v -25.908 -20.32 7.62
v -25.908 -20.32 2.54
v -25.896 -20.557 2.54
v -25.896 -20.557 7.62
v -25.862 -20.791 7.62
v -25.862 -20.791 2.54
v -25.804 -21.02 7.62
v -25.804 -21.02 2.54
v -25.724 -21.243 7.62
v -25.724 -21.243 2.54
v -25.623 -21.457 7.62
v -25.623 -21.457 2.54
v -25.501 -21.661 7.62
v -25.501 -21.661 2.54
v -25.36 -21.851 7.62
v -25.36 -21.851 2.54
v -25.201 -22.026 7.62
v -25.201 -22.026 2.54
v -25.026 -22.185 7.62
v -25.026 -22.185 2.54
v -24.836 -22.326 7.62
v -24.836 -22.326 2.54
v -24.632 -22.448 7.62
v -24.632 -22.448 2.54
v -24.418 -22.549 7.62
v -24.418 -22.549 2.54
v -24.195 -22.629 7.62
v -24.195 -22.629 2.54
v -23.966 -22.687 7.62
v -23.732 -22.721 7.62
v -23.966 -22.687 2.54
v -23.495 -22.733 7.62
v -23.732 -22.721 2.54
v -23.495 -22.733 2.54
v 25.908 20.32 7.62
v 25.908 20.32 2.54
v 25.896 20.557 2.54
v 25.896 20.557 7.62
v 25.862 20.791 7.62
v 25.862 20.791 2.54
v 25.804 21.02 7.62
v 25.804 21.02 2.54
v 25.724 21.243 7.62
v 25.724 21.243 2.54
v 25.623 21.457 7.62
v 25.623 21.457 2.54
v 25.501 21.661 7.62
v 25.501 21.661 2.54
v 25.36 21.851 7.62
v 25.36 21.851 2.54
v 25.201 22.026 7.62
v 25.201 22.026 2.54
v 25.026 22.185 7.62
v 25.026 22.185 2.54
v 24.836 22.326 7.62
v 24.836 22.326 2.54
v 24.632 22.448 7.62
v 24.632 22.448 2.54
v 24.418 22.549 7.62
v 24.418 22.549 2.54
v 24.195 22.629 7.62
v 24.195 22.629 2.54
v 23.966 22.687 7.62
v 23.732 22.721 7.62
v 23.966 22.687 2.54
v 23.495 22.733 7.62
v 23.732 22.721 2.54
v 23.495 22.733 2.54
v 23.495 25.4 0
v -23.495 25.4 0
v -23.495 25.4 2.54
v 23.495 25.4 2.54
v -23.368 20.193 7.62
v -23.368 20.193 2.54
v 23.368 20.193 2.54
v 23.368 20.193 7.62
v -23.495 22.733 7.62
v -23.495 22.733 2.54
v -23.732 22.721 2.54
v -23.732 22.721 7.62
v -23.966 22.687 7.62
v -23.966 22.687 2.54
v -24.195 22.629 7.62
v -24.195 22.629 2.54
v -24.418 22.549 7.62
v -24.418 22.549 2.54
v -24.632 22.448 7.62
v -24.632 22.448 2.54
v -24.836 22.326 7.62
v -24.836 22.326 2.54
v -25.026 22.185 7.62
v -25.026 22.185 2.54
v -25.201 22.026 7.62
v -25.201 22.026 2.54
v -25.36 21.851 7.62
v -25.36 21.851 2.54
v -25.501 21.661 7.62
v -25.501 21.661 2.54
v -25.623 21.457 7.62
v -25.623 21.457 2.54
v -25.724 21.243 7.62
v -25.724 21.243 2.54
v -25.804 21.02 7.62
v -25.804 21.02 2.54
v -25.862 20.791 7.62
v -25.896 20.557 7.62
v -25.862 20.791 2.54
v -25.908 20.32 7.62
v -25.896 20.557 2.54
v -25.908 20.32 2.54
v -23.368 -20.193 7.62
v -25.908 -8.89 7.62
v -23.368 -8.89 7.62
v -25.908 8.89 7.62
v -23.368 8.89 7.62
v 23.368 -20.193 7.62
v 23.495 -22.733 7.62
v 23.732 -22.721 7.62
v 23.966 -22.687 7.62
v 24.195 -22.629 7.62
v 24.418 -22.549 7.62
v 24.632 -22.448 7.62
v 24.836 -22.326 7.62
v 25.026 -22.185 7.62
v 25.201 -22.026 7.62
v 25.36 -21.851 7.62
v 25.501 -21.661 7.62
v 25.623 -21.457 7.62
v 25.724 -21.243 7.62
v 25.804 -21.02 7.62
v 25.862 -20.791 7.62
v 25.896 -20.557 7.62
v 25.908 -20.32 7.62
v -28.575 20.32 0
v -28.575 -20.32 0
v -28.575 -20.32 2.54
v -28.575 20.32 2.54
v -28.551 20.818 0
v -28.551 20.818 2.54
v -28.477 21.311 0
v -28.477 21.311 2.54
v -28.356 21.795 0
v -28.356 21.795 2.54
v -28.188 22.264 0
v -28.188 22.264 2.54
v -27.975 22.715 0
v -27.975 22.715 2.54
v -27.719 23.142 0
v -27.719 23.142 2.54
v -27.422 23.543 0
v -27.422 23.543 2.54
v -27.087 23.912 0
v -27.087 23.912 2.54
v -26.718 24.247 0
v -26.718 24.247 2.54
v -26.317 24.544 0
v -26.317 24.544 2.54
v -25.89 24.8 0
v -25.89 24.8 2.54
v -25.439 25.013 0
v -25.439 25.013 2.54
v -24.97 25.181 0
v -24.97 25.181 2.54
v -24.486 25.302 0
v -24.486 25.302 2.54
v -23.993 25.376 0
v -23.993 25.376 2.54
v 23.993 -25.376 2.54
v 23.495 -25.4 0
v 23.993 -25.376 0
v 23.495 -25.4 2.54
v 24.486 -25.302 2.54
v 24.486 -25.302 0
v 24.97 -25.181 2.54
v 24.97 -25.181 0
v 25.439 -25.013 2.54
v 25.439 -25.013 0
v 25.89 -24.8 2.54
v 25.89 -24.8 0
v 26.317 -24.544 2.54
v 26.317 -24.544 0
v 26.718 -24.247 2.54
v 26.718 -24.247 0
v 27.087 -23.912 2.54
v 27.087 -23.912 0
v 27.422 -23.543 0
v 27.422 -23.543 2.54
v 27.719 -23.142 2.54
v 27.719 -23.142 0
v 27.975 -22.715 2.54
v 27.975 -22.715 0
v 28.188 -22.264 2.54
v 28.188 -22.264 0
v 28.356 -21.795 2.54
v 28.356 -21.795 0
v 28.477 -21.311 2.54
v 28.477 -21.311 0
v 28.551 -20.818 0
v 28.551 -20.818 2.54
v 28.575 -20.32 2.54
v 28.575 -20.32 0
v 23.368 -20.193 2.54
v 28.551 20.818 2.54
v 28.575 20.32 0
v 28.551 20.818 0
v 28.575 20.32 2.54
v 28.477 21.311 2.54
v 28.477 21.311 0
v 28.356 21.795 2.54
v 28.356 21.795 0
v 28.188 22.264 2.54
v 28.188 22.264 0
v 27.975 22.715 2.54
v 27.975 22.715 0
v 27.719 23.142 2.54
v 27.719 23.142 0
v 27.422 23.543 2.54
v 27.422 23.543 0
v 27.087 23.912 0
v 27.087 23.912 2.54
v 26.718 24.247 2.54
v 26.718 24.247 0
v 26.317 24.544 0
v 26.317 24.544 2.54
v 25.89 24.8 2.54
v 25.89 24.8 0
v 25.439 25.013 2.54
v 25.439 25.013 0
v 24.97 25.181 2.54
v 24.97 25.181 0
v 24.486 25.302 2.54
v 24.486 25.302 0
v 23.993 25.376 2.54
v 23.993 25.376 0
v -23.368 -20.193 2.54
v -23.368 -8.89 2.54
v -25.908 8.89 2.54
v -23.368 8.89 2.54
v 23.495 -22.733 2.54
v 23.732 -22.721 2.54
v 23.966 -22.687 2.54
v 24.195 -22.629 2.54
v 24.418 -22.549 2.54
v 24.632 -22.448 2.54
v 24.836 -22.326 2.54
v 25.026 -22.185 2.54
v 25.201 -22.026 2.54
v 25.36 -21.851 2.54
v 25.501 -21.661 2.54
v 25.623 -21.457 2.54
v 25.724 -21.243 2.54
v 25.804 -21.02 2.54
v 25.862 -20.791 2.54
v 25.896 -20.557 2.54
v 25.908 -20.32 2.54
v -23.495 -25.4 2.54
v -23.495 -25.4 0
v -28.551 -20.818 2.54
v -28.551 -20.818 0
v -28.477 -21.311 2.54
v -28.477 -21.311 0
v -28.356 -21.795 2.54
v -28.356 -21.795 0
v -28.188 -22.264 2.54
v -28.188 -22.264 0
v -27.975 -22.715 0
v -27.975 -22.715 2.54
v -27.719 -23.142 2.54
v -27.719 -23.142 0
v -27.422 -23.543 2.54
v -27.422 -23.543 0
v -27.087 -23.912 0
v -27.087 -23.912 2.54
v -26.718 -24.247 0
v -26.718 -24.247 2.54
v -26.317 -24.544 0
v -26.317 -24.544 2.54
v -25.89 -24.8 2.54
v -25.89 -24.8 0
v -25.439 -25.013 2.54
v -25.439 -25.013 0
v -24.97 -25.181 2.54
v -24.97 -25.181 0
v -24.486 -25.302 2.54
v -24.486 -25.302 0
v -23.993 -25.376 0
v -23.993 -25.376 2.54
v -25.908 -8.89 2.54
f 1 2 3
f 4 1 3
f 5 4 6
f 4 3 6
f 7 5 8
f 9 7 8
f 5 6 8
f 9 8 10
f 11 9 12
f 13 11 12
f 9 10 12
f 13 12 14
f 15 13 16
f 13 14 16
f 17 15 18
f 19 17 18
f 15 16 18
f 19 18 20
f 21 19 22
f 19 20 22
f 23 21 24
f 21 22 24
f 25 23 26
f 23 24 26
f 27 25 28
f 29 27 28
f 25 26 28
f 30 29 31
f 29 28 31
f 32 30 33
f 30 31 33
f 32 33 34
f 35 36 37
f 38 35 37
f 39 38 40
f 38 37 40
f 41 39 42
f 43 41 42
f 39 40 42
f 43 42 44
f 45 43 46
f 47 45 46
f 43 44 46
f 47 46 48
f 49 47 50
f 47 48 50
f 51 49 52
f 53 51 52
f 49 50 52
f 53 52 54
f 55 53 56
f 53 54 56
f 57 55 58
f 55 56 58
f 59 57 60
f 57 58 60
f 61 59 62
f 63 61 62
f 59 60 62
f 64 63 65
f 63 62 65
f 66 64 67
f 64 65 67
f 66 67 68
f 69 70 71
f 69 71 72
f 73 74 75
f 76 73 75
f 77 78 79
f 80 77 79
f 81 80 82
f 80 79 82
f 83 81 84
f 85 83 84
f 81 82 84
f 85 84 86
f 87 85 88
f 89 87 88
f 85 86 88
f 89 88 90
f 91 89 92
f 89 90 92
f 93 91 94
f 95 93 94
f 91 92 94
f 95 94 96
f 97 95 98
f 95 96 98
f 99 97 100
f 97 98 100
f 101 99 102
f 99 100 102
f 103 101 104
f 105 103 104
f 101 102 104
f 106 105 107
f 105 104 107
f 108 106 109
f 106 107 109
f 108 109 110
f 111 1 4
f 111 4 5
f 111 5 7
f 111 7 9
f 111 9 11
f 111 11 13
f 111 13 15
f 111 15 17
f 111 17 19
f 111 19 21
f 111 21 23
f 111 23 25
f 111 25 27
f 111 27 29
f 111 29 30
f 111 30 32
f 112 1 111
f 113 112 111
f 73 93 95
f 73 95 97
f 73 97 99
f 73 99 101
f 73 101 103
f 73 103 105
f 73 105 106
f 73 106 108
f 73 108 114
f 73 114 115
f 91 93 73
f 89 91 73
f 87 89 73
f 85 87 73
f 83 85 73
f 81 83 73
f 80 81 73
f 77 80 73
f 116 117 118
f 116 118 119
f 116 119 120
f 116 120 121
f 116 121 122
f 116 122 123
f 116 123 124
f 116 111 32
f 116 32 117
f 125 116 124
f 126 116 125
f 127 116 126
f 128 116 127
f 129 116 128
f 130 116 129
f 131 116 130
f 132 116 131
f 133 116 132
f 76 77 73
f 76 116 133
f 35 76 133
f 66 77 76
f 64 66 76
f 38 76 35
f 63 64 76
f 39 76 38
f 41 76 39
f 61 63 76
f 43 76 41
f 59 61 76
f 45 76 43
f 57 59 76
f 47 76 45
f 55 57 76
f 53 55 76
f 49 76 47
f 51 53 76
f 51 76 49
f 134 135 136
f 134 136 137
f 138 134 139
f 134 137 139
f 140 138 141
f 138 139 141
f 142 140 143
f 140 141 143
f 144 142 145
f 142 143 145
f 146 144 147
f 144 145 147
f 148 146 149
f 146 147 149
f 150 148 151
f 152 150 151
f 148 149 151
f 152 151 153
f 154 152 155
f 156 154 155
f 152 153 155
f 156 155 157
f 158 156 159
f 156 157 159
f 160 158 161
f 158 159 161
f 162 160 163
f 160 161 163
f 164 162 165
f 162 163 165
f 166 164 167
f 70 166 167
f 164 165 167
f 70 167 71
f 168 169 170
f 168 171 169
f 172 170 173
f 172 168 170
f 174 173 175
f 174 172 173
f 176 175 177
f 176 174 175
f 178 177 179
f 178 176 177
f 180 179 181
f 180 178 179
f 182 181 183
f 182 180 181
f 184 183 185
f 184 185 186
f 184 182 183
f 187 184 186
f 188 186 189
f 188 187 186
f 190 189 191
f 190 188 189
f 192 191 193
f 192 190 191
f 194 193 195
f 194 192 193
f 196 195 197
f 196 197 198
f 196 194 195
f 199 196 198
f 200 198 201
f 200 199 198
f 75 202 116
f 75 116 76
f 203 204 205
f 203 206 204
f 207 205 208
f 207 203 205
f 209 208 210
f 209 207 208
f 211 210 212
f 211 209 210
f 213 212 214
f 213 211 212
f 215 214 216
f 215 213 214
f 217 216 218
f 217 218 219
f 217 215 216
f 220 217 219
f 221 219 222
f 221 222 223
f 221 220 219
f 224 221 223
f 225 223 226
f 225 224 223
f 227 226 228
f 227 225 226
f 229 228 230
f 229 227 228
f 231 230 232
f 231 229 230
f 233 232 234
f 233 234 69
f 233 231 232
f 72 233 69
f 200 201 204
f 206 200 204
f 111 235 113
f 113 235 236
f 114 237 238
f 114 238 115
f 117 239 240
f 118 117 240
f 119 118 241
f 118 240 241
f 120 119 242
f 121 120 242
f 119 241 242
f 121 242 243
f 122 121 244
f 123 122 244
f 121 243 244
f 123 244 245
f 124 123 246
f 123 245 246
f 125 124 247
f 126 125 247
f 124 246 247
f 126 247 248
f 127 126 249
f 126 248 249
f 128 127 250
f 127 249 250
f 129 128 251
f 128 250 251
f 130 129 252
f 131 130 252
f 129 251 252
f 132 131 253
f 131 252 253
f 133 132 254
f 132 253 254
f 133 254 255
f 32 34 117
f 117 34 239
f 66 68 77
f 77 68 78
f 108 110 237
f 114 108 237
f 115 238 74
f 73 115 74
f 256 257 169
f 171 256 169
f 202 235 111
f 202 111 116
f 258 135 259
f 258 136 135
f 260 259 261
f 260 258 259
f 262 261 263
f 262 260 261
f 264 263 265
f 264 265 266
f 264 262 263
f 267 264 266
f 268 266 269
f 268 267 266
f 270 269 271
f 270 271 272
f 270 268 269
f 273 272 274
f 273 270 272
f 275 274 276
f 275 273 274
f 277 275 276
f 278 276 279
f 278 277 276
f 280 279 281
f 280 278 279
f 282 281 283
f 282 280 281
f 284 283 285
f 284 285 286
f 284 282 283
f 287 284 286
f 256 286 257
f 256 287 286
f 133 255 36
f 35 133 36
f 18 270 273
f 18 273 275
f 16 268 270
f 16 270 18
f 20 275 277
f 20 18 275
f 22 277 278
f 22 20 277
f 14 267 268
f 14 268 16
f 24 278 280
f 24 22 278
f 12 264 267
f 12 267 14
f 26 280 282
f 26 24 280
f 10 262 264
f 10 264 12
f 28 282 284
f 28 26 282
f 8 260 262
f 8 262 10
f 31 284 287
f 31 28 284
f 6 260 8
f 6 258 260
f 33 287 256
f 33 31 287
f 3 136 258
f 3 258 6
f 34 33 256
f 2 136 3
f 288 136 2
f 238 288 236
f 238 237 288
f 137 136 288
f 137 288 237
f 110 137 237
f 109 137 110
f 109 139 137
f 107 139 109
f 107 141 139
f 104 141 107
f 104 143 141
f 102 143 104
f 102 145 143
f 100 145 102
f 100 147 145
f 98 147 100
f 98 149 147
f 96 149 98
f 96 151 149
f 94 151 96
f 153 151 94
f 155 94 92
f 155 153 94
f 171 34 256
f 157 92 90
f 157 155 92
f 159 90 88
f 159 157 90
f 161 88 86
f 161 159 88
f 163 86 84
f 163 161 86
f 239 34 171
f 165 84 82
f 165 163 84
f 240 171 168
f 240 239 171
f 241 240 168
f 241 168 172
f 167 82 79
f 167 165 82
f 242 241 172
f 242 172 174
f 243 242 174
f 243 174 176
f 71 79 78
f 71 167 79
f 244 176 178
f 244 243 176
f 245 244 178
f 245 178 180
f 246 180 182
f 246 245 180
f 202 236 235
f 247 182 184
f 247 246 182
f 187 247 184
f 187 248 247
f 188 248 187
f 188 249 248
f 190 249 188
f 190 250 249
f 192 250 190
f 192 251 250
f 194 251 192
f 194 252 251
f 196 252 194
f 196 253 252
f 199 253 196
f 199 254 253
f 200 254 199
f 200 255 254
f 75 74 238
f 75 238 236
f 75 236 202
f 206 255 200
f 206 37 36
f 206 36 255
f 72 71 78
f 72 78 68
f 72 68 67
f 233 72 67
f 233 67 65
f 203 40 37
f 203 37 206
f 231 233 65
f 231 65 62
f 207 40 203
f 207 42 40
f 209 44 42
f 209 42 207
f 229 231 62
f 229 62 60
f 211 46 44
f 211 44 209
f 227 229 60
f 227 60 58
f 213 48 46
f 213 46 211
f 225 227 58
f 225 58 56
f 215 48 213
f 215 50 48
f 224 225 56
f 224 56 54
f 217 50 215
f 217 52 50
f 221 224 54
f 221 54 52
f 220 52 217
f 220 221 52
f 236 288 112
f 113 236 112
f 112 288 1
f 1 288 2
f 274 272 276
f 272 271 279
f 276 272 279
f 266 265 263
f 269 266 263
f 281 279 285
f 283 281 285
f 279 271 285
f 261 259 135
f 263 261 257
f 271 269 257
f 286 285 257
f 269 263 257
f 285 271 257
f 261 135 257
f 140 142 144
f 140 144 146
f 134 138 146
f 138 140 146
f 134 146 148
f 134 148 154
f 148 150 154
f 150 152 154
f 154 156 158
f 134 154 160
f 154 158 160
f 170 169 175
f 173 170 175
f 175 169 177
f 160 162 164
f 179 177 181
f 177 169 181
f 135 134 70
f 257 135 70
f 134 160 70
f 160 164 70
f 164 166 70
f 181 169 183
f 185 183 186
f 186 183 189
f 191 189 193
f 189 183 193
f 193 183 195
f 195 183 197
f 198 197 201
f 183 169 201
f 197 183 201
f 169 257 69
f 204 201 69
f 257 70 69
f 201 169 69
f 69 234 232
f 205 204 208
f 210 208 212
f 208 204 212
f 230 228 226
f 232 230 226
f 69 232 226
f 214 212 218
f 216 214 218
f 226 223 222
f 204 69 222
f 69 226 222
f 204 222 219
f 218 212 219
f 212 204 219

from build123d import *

# Parameters (mm, degrees)
F0_W     = 57.15
F0_H     = 50.8
F1_DEPTH = 2.54
F2_R     = 5.08
F3_W     = 46.736
F3_H     = 40.386
F4_DEPTH = 5.08
F5_W     = 17.78
F5_H     = 5.08
F6_DEPTH = 2.54


with BuildPart() as f1:
    # F0 (on Top) → F1 (new body)
    with BuildSketch(Plane.XY):
        Rectangle(F0_W, F0_H)
    extrude(amount=F1_DEPTH)

    # F2
    f2_edges = [f1.edges().sort_by_distance(p)[0] for p in [
        (-28.575, 25.4, 1.27),
        (28.575, 25.4, 1.27),
        (28.575, -25.4, 1.27),
        (-28.575, -25.4, 1.27),
    ]]
    fillet(f2_edges, radius=F2_R)

    # F3 (on face) → F4 (join)
    with BuildSketch(Plane.XY.offset(2.54)):
        with BuildLine():
            Line((25.908, -20.32), (25.908, 20.32))
            ThreePointArc((25.908, 20.32), (25.201249, 22.026249), (23.495, 22.733))
            Line((23.495, 22.733), (-23.495, 22.733))
            ThreePointArc((-23.495, 22.733), (-25.201249, 22.026249), (-25.908, 20.32))
            Line((-25.908, 20.32), (-25.908, -20.32))
            ThreePointArc((-25.908, -20.32), (-25.201249, -22.026249), (-23.495, -22.733))
            Line((-23.495, -22.733), (23.495, -22.733))
            ThreePointArc((23.495, -22.733), (25.201249, -22.026249), (25.908, -20.32))
        make_face()
        Rectangle(F3_W, F3_H, mode=Mode.SUBTRACT)
    extrude(amount=F4_DEPTH)

    # F5 (on face) → F6 (cut, through all)
    with BuildSketch(Plane(origin=(-25.908, 0, 0), x_dir=(0, -1, 0), z_dir=(-1, 0, 0))):
        with Locations((0, 5.08)):
            Rectangle(F5_W, F5_H)
    extrude(amount=-F6_DEPTH, mode=Mode.SUBTRACT)


solid = f1.part
